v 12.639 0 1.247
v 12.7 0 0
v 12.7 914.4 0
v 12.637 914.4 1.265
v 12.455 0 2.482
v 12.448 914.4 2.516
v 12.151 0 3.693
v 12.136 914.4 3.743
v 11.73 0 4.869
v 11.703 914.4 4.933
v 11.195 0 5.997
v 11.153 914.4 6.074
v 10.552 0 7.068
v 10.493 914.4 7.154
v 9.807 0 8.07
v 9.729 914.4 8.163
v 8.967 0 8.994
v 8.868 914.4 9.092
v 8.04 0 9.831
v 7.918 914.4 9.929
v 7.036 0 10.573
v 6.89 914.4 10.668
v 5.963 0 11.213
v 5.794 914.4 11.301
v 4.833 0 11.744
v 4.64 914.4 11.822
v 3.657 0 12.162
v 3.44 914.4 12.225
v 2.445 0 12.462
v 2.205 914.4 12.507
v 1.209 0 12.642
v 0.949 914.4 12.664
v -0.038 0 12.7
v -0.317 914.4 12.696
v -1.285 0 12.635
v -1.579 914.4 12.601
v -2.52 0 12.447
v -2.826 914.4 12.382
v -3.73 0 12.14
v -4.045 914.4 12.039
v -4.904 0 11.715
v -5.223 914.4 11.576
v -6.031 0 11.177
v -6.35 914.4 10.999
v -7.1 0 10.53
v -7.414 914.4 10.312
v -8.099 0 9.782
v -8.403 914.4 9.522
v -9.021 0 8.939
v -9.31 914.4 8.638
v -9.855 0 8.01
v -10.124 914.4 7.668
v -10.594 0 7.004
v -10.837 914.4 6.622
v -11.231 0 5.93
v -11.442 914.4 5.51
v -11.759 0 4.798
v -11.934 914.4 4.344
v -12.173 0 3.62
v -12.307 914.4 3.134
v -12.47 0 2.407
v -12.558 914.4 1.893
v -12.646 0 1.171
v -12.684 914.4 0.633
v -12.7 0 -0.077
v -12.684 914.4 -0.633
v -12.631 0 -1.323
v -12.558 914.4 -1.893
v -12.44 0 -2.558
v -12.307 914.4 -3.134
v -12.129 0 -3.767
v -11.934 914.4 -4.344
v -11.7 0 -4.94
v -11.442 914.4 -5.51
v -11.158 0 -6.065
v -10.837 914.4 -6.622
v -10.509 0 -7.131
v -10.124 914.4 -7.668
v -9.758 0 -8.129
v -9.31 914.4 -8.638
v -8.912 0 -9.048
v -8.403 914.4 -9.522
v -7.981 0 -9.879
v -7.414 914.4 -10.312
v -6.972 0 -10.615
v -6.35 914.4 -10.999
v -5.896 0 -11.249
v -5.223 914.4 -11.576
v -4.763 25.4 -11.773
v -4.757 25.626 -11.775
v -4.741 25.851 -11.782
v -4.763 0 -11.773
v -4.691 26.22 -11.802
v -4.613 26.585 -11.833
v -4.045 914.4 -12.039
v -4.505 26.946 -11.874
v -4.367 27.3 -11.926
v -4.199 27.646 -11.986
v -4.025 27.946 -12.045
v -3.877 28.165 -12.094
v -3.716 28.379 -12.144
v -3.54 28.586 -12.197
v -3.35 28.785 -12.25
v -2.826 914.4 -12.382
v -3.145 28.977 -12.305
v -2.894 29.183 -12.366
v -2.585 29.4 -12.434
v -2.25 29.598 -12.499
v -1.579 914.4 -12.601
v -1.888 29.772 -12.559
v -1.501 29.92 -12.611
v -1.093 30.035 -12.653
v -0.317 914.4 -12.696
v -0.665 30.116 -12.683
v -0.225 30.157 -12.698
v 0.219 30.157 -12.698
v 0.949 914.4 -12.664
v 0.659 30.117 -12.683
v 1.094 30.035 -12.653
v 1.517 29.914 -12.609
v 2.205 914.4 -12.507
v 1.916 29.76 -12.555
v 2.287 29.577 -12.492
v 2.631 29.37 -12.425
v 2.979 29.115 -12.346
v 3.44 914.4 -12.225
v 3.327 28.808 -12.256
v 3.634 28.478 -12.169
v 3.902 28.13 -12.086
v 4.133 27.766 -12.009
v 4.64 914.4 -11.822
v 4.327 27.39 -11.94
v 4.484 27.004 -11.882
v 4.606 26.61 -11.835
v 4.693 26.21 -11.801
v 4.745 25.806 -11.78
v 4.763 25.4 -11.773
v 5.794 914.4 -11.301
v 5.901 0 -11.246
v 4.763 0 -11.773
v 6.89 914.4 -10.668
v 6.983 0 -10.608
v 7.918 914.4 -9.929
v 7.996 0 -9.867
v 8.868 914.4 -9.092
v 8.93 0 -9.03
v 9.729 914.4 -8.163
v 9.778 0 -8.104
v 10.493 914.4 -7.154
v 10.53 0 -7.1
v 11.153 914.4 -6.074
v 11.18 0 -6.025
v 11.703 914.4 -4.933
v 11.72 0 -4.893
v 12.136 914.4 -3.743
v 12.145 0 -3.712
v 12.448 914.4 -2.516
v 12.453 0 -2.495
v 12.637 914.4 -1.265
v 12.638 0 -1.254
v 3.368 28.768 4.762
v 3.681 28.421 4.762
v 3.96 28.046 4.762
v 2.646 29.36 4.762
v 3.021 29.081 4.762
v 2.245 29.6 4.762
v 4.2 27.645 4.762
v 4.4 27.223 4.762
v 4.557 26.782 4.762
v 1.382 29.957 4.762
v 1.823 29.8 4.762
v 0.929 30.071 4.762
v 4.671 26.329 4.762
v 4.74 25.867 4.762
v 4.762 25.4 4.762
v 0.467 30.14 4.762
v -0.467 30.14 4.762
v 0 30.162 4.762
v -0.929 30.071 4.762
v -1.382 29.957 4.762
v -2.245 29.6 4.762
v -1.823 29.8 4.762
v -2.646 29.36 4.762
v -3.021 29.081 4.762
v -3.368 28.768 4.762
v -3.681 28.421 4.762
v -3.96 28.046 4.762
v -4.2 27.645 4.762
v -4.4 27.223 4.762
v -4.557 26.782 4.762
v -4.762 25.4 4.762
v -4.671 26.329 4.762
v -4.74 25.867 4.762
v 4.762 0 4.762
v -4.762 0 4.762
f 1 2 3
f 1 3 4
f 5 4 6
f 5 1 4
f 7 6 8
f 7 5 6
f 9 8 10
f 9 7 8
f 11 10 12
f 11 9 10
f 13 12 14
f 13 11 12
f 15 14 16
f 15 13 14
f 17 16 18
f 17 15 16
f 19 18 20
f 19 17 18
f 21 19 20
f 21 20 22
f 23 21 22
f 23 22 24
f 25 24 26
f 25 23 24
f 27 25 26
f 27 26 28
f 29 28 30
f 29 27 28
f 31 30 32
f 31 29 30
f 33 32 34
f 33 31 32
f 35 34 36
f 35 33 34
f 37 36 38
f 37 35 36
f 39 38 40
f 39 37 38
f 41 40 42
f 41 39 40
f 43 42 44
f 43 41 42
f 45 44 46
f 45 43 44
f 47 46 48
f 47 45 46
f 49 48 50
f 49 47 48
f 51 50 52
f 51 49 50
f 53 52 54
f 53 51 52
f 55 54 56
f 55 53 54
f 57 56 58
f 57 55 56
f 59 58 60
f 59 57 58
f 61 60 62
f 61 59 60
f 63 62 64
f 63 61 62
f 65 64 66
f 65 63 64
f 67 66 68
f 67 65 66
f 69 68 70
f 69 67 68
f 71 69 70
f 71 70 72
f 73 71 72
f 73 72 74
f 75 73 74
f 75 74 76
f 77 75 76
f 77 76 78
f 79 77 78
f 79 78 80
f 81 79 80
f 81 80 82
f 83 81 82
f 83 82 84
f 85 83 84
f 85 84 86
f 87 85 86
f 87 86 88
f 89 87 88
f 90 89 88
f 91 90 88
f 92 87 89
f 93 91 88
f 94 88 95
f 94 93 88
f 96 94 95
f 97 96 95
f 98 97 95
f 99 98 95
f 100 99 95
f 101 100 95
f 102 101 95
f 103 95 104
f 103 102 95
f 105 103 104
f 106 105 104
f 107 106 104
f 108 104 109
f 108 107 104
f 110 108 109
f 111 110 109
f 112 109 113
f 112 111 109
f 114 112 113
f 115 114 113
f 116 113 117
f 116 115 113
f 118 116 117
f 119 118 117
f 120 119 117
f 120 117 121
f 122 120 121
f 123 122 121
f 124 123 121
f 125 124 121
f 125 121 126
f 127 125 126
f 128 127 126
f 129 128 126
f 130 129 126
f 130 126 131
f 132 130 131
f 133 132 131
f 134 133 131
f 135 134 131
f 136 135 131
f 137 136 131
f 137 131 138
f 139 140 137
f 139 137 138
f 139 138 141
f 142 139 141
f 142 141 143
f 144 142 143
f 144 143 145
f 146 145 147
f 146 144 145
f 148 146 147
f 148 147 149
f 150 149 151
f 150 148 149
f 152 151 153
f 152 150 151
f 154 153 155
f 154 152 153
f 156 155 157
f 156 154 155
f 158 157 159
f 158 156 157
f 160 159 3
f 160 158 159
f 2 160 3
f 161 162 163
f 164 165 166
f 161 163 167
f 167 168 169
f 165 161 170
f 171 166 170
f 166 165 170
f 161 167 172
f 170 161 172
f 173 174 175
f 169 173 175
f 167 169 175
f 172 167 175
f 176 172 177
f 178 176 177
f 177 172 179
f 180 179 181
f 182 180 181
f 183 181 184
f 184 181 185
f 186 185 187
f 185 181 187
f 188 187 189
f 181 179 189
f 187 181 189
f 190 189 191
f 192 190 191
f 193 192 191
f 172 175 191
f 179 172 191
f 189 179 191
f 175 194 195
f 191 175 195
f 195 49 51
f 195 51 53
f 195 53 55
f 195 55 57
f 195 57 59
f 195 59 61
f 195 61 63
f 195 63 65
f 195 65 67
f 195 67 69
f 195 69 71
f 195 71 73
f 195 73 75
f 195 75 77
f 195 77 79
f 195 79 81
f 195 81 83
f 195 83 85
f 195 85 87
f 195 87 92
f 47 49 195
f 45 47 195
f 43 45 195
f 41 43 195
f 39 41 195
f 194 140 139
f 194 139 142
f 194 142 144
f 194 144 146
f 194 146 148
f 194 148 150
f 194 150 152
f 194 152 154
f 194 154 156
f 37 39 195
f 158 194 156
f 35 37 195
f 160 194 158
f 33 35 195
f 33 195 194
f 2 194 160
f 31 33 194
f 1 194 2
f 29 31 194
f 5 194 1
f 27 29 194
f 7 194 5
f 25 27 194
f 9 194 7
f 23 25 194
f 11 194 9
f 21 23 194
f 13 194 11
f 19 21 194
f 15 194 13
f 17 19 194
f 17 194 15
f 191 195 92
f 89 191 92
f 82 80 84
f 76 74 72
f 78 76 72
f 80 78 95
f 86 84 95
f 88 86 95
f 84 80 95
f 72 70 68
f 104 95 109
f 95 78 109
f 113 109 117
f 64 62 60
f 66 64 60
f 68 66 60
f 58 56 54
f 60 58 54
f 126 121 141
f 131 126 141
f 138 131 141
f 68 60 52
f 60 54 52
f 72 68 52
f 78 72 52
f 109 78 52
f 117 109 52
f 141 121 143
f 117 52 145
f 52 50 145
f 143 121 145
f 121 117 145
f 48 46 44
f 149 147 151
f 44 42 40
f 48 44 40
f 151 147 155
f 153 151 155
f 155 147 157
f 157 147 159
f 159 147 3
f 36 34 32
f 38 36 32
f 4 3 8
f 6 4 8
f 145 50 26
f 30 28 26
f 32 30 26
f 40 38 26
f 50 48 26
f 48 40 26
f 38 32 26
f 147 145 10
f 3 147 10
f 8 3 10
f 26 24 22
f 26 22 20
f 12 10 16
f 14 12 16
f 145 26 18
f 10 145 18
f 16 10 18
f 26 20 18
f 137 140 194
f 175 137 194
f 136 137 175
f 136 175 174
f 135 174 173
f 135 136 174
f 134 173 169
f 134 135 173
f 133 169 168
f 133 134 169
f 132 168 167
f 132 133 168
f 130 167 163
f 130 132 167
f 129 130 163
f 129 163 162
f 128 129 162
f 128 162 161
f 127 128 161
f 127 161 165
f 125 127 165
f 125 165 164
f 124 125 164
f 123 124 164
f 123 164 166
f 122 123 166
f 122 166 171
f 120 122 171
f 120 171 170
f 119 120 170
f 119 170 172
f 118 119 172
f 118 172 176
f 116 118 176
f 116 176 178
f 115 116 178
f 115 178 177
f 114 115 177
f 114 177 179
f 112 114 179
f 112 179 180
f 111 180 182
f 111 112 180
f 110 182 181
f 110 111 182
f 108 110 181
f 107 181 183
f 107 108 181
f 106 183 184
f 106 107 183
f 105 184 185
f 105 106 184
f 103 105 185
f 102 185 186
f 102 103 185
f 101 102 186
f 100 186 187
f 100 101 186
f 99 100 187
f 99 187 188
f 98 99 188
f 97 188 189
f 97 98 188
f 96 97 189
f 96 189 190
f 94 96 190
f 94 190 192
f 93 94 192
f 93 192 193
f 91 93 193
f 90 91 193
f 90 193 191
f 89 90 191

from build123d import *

# Parameters (mm, degrees)
F0_R     = 12.7
F1_DEPTH = 914.4
F3_DEPTH = 25.4
F6_DEPTH = 17.4625


with BuildPart() as f1:
    # F0 (on Front) → F1 (new body)
    with BuildSketch(Plane.XZ):
        Circle(F0_R)
    extrude(amount=-F1_DEPTH)

    # F2 (on face) → F3 (cut)
    with BuildSketch(Plane.XZ):
        with BuildLine():
            Line((4.7625, 4.7625), (-4.7625, 4.7625))
            Line((-4.7625, 4.7625), (-4.7625, -11.773215))
            ThreePointArc((-4.7625, -11.773215), (0, -12.7), (4.7625, -11.773215))
            Line((4.7625, -11.773215), (4.7625, 4.7625))
        make_face()
    extrude(amount=-F3_DEPTH, mode=Mode.SUBTRACT)

    # F5 (on offset) → F6 (cut, through all)
    with BuildSketch(Plane.XY.offset(-12.7)):
        with BuildLine():
            ThreePointArc((4.7625, 25.4), (0, 30.1625), (-4.7625, 25.4))
            Line((-4.7625, 25.4), (4.7625, 25.4))
        make_face()
    extrude(amount=F6_DEPTH, mode=Mode.SUBTRACT)


solid = f1.part
